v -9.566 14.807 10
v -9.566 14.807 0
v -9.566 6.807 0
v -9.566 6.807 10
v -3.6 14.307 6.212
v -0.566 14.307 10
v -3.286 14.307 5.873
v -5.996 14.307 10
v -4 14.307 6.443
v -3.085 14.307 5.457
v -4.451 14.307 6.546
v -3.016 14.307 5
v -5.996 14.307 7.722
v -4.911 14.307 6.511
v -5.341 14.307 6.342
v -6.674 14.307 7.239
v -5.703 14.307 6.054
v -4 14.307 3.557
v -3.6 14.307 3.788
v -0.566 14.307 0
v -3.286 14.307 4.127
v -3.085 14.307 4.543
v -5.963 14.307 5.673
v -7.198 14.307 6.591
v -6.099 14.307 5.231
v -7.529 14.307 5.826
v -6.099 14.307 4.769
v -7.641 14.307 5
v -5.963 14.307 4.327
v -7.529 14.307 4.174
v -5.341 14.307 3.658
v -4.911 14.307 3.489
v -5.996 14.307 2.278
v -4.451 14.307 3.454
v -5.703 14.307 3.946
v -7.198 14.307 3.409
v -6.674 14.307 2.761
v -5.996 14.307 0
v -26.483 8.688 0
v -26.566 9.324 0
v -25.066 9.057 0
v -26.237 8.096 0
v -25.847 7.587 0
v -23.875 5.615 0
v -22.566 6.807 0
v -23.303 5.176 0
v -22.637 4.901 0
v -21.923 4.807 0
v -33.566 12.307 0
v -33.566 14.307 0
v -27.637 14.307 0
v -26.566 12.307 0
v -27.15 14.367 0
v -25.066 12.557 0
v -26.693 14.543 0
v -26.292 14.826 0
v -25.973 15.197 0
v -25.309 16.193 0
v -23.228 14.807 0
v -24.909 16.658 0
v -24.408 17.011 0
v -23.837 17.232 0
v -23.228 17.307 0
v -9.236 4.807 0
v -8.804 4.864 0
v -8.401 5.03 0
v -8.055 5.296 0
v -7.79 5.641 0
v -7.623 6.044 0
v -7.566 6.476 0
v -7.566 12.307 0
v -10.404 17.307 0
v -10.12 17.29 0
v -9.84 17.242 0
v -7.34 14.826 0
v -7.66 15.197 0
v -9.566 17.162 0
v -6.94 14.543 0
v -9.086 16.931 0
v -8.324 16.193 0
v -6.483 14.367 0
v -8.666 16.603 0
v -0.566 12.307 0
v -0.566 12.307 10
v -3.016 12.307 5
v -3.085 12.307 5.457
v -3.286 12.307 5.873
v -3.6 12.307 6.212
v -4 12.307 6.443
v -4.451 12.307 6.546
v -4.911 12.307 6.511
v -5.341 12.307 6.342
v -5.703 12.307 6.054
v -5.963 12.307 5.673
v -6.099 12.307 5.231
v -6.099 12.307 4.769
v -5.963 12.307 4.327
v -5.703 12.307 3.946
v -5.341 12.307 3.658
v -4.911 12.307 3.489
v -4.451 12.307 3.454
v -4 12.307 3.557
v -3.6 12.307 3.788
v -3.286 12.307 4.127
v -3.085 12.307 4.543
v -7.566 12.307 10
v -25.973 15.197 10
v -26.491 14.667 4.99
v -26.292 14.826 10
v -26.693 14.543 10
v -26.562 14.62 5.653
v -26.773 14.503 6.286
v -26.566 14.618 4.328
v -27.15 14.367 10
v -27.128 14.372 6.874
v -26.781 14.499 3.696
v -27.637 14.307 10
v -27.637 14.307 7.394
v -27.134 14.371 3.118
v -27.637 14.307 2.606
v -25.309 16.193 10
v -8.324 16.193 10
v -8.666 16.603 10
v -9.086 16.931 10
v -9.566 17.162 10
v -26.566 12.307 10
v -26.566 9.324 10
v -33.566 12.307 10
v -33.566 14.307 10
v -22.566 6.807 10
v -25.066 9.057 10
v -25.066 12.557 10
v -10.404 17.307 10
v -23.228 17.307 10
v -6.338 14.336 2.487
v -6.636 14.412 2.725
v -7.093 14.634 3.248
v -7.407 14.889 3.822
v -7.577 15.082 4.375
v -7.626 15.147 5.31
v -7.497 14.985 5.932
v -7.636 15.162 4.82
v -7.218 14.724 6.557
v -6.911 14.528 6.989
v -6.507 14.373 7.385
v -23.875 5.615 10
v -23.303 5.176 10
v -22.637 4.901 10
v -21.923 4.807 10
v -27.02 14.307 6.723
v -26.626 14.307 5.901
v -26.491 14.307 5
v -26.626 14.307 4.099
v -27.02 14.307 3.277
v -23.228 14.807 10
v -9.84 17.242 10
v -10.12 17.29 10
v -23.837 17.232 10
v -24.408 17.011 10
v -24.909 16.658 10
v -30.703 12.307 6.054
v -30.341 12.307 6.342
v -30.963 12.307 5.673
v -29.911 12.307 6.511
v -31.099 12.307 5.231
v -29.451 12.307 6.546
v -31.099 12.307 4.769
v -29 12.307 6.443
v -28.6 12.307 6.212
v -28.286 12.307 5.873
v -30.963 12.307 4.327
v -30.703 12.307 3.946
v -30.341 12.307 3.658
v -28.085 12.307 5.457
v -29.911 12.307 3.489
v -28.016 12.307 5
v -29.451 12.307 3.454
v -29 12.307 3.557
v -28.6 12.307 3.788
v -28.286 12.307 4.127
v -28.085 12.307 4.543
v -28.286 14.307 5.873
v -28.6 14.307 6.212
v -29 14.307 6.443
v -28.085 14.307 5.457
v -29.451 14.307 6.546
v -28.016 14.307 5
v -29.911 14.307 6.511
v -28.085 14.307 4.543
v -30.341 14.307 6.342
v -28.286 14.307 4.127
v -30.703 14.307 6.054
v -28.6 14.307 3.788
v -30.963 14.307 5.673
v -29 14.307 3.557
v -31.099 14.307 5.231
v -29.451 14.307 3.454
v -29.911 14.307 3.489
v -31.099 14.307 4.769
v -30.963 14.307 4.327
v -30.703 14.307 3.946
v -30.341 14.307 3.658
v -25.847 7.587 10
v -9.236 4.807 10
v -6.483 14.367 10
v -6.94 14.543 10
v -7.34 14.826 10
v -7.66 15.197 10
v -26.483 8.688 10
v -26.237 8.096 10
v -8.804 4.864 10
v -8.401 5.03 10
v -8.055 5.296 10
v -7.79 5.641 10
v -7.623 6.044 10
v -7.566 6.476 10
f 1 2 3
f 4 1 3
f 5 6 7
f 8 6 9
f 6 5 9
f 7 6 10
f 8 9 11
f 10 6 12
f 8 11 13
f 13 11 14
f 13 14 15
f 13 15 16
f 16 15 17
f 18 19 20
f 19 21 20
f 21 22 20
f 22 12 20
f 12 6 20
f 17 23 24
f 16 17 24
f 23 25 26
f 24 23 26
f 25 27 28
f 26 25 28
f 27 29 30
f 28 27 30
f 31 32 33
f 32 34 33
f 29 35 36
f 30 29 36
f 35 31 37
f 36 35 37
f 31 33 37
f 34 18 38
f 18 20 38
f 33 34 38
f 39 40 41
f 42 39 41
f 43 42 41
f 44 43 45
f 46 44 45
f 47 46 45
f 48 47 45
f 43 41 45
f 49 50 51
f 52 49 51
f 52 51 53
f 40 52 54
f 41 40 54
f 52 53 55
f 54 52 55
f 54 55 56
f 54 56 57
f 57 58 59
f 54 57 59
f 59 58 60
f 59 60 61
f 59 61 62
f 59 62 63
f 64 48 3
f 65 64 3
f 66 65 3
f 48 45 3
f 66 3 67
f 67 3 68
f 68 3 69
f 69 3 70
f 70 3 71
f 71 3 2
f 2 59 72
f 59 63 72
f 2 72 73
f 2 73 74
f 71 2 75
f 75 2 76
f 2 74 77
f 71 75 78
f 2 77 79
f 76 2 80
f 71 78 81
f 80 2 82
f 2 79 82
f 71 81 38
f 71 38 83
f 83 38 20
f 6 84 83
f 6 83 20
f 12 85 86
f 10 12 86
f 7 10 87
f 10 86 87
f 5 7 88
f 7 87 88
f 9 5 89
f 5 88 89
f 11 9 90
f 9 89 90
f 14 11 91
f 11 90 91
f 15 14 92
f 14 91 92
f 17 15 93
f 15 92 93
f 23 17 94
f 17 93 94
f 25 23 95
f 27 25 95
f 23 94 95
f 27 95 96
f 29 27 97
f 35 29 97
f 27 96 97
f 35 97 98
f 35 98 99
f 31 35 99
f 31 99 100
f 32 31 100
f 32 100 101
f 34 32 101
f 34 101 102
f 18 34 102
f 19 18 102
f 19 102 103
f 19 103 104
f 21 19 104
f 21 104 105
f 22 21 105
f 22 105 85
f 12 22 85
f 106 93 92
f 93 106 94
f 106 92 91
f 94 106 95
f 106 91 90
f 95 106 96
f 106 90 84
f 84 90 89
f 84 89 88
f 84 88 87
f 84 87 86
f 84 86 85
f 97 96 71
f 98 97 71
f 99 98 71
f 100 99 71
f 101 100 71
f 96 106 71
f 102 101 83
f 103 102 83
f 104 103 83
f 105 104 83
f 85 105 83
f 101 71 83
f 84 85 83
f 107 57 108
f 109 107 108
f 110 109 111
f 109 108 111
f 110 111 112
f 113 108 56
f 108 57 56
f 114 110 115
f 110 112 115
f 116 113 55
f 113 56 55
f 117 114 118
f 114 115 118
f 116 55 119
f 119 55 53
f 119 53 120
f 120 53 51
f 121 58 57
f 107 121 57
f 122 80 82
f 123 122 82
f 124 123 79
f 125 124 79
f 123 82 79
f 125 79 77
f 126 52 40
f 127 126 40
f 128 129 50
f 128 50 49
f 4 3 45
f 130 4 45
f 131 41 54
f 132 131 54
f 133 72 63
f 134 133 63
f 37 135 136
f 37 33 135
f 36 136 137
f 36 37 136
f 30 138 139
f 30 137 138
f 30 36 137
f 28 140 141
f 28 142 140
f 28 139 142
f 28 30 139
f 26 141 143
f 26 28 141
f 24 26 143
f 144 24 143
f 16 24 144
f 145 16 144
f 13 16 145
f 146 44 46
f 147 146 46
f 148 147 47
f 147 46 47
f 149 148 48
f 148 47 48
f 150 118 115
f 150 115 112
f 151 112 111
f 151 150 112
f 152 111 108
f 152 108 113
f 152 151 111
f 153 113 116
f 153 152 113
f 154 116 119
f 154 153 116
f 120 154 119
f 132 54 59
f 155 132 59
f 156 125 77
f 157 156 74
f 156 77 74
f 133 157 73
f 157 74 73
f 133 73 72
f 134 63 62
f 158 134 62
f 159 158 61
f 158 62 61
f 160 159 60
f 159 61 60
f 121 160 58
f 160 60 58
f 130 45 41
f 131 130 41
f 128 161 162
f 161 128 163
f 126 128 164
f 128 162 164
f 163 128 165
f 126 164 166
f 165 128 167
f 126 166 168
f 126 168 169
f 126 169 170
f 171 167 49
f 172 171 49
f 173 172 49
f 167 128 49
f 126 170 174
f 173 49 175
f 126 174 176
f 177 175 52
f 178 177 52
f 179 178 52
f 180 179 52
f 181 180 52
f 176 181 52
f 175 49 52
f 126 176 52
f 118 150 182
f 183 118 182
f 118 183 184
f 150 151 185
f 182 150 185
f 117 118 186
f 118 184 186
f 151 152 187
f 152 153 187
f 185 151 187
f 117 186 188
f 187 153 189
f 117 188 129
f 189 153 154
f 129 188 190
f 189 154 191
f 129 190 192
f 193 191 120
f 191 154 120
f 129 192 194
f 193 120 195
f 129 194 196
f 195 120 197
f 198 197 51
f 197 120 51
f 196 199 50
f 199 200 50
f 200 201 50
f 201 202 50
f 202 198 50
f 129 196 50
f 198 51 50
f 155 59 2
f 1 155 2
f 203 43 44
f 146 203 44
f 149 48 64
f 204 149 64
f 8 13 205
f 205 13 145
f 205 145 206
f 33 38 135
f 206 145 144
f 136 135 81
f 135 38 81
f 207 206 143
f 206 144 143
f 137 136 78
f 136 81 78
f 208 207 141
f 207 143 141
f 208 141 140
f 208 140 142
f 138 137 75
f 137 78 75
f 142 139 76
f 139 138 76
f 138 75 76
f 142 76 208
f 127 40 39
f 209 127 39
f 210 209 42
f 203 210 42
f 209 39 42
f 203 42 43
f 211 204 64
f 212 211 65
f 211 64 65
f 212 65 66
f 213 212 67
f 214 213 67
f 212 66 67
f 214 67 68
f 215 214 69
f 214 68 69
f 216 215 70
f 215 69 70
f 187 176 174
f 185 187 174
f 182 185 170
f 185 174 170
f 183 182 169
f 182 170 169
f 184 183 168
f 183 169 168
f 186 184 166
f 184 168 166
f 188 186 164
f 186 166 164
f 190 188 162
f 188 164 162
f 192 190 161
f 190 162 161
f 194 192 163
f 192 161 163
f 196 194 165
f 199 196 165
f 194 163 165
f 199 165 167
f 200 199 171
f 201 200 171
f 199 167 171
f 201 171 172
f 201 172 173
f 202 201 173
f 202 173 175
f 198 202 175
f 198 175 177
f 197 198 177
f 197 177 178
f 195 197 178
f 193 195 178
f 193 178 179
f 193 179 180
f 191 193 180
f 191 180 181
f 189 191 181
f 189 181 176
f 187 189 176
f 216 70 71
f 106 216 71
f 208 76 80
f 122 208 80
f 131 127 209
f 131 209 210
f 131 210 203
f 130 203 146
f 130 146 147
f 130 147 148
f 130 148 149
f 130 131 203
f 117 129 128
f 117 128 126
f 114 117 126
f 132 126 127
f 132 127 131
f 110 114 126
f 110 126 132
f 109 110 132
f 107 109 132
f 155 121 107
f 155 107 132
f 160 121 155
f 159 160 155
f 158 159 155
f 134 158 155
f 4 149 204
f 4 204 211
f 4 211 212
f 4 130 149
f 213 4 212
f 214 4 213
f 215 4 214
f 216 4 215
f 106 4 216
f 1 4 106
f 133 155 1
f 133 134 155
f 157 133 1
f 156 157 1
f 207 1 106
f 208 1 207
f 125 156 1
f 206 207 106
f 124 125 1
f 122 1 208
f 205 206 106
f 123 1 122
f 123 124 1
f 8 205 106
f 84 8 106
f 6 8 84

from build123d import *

# Parameters (mm, degrees)
F1_DEPTH = 10
F2_R     = 1.55
F3_DEPTH = 5
F4_R     = 3.075
F5_DEPTH = 5
F6_R     = 3.075
F7_DEPTH = 5


# Not quite as in the source:
# - a feature names something its author has since deleted; it is built from what else it names


with BuildPart() as f1:
    # F0 (on Top) → F1 (new body)
    with BuildSketch(Plane.XY):
        with BuildLine():
            Line((-1.5664058328, 14.3066409416), (-5.9960383158, 14.3066409416))
            ThreePointArc((-5.9960383158, 14.3066409416), (-6.9397541669, 14.5432917441), (-7.6601389045, 15.1972405492))
            Line((-7.6601389045, 15.1972405492), (-8.3242394931, 16.1933914322))
            ThreePointArc((-8.3242394931, 16.1933914322), (-8.8670406285, 16.7780954993), (-9.5664058328, 17.1620228746))
            ThreePointArc((-9.5664058328, 17.1620228746), (-9.9791916365, 17.2702211446), (-10.404365229, 17.3066409416))
            Line((-10.404365229, 17.3066409416), (-23.2284464365, 17.3066409416))
            ThreePointArc((-23.2284464365, 17.3066409416), (-24.4080912504, 17.0108274386), (-25.3085721724, 16.1933914322))
            Line((-25.3085721724, 16.1933914322), (-25.9726727611, 15.1972405492))
            ThreePointArc((-25.9726727611, 15.1972405492), (-26.6930574987, 14.5432917441), (-27.6367733497, 14.3066409416))
            Line((-27.6367733497, 14.3066409416), (-32.5664058328, 14.3066409416))
            Line((-32.5664058328, 14.3066409416), (-33.5664058328, 14.3066409416))
            Line((-33.5664058328, 14.3066409416), (-33.5664058328, 12.3066409416))
            Line((-33.5664058328, 12.3066409416), (-32.5664058328, 12.3066409416))
            Line((-32.5664058328, 12.3066409416), (-26.5664058328, 12.3066409416))
            Line((-26.5664058328, 12.3066409416), (-26.5664058328, 9.3240286596))
            ThreePointArc((-26.5664058328, 9.3240286596), (-26.3794394083, 8.3840849704), (-25.8470040783, 7.5872391872))
            Line((-25.8470040783, 7.5872391872), (-23.8748829035, 5.6151180124))
            ThreePointArc((-23.8748829035, 5.6151180124), (-22.979372793, 5.0167572865), (-21.9230465945, 4.8066409416))
            Line((-21.9230465945, 4.8066409416), (-9.2356068064, 4.8066409416))
            ThreePointArc((-9.2356068064, 4.8066409416), (-8.0553034788, 5.2955385877), (-7.5664058328, 6.4758419153))
            Line((-7.5664058328, 6.4758419153), (-7.5664058328, 12.3066409416))
            Line((-7.5664058328, 12.3066409416), (-1.5664058328, 12.3066409416))
            Line((-1.5664058328, 12.3066409416), (-0.5664058328, 12.3066409416))
            Line((-0.5664058328, 12.3066409416), (-0.5664058328, 14.3066409416))
            Line((-0.5664058328, 14.3066409416), (-1.5664058328, 14.3066409416))
        make_face()
        Polygon((-9.5664058328, 14.8066409416), (-9.5664058328, 6.8066409416), (-22.5664058328, 6.8066409416), (-25.0664058328, 9.0566409416), (-25.0664058328, 10.8066409416), (-25.0664058328, 12.5566409416), (-23.2284464365, 14.8066409416), (-22.5664058328, 14.8066409416), align=None, mode=Mode.SUBTRACT)
    extrude(amount=F1_DEPTH)

    # F2 (on face) → F3 (cut)
    with BuildSketch(Plane.XZ.offset(-12.3066409416)):
        with Locations((-29.5664058328, 5)):
            Circle(F2_R)
        with Locations((-4.5664058328, 5)):
            Circle(F2_R)
    extrude(amount=-F3_DEPTH, mode=Mode.SUBTRACT)

    # F4 (on face) → F5 (cut)
    with BuildSketch(Plane(origin=(0, 14.3066409416, 0), x_dir=(-1, 0, 0), z_dir=(0, 1, 0))):
        with Locations((29.5664058328, 5)):
            Circle(F4_R)
    extrude(amount=F5_DEPTH, mode=Mode.SUBTRACT)

    # F6 (on face) → F7 (cut)
    with BuildSketch(Plane(origin=(0, 14.3066409416, 0), x_dir=(-1, 0, 0), z_dir=(0, 1, 0))):
        with Locations((4.5664058328, 5)):
            Circle(F6_R)
    extrude(amount=F7_DEPTH, mode=Mode.SUBTRACT)


solid = f1.part
